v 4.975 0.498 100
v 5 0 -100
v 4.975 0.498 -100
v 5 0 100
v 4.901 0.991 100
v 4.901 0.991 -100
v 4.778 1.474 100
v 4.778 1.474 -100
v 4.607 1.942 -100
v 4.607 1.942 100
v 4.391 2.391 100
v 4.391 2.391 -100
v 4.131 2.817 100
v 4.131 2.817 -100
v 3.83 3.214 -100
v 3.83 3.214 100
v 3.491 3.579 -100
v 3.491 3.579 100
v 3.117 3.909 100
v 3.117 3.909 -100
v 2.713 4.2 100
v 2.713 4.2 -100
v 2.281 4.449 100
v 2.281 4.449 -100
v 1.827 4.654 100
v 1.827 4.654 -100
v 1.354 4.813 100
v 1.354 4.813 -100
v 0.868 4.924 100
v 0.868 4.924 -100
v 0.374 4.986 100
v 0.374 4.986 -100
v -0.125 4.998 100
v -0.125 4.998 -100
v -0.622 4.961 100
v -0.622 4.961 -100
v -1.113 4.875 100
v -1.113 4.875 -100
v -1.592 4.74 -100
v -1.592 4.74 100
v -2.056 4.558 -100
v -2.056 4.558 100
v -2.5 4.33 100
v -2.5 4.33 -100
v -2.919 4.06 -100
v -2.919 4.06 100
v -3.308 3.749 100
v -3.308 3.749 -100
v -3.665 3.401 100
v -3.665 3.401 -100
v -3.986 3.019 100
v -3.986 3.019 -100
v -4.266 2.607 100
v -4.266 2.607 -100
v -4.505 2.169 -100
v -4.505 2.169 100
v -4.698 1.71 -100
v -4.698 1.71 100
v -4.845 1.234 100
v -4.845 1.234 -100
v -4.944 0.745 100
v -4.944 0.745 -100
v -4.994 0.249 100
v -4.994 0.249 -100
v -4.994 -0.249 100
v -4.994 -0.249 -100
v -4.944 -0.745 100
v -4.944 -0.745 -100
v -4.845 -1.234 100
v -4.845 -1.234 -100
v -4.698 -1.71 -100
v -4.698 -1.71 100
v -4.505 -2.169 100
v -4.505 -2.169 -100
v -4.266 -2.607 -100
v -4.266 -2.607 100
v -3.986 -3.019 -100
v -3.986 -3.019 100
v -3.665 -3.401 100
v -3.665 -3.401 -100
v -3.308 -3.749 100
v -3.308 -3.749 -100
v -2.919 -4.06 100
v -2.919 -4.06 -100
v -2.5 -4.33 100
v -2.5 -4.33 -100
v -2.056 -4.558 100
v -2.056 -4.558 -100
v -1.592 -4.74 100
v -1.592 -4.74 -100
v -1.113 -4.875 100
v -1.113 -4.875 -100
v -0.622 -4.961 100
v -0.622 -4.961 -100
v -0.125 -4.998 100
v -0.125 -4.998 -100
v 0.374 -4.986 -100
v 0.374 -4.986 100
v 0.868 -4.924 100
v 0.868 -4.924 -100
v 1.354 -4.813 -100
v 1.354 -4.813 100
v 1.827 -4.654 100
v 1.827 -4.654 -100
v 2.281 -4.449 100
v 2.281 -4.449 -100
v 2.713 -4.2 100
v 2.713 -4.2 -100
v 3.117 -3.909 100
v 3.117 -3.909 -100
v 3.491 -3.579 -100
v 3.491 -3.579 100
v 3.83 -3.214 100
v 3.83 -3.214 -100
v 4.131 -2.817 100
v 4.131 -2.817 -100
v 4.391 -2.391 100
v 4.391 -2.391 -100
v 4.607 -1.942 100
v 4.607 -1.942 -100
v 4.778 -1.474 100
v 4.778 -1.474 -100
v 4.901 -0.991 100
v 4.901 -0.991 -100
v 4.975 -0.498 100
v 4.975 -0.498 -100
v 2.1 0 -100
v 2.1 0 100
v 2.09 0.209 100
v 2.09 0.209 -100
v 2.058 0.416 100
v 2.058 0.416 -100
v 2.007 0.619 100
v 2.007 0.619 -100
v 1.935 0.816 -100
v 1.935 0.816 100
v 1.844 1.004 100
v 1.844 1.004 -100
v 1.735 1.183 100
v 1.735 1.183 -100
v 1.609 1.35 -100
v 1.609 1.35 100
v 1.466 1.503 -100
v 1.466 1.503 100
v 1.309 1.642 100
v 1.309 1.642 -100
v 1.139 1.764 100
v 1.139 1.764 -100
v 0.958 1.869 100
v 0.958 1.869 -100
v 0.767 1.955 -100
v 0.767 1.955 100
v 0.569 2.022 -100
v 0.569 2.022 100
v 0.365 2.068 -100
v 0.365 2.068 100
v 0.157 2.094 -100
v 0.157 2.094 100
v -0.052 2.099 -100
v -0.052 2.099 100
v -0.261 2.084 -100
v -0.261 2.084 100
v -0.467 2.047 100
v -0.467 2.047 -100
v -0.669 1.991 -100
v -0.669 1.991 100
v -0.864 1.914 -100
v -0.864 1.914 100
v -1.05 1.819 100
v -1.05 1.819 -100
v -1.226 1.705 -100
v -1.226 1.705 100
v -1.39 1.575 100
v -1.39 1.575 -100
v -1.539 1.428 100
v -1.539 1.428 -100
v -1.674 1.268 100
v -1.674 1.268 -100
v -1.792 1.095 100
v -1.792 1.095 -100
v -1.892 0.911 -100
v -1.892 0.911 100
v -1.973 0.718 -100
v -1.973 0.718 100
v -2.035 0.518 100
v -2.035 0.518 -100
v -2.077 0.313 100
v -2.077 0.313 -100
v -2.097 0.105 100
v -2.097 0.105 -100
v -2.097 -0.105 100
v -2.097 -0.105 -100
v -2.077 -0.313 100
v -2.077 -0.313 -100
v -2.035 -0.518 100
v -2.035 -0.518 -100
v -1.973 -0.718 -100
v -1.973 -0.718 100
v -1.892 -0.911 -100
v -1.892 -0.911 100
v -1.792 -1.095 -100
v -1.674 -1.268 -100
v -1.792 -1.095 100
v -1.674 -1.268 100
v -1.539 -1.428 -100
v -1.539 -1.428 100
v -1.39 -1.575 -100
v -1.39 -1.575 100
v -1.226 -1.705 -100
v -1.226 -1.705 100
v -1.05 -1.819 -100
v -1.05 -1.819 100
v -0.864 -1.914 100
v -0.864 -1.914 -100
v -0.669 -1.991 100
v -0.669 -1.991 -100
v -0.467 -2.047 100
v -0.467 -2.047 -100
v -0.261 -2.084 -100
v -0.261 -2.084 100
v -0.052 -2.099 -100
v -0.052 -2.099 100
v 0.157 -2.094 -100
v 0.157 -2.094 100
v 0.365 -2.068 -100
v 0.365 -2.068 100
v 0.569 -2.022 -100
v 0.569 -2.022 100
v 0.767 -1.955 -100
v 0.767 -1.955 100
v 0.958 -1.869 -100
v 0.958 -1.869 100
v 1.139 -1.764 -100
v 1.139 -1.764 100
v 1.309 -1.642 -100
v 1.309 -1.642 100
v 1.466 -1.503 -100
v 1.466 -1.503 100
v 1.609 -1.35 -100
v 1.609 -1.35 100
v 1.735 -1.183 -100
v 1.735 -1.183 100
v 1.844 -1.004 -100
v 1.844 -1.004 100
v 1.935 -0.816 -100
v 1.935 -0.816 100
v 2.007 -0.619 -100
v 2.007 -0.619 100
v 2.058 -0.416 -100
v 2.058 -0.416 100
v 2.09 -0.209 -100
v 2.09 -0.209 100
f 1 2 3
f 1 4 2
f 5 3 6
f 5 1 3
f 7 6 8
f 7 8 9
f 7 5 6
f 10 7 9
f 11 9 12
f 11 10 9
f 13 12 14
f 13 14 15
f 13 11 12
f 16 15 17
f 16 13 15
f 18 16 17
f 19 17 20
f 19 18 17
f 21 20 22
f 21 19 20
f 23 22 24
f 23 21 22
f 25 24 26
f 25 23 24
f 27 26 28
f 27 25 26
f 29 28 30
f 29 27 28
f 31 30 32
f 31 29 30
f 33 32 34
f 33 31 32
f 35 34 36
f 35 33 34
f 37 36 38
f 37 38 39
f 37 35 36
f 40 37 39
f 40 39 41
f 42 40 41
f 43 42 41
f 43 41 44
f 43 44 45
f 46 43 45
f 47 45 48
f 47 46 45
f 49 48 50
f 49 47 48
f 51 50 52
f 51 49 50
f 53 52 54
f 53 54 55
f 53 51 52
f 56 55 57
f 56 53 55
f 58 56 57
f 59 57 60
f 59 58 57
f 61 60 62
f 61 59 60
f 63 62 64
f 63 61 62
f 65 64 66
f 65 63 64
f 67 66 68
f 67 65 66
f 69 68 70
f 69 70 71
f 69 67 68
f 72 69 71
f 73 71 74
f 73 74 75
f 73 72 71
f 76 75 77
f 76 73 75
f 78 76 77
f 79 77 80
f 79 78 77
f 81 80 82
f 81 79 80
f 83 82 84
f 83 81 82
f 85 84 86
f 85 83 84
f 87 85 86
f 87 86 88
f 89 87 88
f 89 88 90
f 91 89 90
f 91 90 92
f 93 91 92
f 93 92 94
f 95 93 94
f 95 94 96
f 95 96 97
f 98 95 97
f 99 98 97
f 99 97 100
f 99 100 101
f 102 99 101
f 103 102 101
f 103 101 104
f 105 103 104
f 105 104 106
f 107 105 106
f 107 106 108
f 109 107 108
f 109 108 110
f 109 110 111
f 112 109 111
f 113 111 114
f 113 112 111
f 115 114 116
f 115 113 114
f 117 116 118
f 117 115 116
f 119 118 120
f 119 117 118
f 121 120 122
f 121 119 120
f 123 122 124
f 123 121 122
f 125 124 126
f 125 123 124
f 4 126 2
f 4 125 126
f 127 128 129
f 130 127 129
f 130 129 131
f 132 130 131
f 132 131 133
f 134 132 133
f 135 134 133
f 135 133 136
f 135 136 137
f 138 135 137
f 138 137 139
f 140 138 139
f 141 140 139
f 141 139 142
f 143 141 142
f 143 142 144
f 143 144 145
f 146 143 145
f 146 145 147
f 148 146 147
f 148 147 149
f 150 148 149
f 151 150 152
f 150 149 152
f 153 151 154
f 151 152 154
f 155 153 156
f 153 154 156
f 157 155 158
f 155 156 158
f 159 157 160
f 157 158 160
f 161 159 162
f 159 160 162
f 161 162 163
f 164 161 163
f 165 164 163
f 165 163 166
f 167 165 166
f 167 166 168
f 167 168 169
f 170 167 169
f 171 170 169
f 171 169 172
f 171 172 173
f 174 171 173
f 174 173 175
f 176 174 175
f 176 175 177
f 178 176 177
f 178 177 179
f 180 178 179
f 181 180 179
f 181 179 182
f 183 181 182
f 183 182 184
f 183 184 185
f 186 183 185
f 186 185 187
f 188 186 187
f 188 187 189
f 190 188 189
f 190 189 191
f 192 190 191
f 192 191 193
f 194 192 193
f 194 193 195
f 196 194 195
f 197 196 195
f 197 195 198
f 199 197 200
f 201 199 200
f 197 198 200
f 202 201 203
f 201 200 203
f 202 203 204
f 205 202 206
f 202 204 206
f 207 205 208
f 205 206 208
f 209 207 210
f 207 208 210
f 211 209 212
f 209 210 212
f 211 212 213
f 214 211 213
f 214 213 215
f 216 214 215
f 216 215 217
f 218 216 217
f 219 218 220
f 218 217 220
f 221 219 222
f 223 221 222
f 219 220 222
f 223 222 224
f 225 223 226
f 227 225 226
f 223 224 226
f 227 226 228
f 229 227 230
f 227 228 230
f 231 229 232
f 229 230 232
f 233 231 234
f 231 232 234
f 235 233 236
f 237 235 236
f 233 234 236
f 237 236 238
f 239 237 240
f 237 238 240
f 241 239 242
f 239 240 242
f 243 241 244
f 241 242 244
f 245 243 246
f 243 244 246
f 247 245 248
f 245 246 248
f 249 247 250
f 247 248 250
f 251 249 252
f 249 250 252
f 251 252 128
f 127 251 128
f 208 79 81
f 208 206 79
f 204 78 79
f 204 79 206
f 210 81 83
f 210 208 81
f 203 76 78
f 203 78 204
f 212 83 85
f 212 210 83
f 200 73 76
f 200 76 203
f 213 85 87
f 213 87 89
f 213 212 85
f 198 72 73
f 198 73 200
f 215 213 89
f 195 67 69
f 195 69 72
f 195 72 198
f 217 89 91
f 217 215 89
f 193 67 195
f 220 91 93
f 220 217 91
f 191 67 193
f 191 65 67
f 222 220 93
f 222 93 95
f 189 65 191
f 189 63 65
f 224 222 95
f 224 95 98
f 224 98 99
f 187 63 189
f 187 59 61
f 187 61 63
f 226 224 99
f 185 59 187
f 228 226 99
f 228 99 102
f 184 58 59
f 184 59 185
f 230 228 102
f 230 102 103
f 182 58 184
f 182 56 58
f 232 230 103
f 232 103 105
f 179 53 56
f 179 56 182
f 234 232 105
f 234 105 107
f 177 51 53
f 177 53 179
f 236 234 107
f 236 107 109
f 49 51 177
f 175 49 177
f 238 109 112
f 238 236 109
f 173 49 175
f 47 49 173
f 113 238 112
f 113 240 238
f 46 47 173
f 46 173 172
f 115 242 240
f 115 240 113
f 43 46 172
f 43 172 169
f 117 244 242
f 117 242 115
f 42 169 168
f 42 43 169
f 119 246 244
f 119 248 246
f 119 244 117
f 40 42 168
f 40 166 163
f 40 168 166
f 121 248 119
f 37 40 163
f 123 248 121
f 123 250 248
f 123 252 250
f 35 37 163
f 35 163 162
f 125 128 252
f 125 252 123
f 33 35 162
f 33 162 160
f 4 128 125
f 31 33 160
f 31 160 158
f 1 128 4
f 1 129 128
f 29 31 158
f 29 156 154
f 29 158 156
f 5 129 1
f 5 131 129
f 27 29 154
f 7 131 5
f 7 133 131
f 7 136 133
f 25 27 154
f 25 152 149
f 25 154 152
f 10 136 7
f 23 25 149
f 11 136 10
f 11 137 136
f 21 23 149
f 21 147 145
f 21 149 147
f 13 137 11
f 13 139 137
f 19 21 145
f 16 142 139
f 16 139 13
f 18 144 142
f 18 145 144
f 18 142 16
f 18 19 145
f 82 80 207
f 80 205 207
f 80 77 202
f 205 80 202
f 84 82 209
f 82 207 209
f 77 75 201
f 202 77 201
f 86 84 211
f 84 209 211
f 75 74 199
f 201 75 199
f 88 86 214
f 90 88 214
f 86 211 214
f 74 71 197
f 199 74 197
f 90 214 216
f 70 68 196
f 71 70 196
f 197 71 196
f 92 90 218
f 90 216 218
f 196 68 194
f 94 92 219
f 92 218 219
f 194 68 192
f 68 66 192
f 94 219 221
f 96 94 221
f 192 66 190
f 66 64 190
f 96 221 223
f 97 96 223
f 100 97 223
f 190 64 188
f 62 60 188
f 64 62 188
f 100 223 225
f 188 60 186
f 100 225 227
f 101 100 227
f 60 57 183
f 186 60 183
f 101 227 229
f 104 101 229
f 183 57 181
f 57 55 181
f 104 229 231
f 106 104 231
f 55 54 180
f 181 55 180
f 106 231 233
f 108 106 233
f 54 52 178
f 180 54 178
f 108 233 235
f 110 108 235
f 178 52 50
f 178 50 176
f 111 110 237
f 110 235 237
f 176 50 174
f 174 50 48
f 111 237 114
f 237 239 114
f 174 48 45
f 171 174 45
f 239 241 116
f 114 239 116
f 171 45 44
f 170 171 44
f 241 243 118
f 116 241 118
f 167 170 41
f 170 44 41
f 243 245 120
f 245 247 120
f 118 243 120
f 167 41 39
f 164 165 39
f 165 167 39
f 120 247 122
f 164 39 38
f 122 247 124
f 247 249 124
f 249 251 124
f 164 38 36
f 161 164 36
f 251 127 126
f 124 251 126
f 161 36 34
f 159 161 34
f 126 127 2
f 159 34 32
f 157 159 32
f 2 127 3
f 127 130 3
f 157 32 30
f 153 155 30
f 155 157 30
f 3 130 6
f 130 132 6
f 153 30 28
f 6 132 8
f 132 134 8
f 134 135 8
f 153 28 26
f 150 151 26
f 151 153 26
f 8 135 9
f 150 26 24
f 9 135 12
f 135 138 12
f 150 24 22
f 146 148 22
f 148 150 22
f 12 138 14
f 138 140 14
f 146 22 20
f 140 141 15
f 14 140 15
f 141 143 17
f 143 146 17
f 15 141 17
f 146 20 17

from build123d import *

# Parameters (mm, degrees)
SKETCH_R    = 5
PAD_DEPTH   = 100
SKETCH001_R = 2.1
HOLE_DEPTH  = 600.999753


with BuildPart() as part:
    # Sketch → Pad (new body, symmetric)
    with BuildSketch(Plane.XY):
        Circle(SKETCH_R)
    extrude(amount=PAD_DEPTH, both=True)

    # Sketch001 (on Face3 of Pad) → Hole (cut, through all)
    with BuildSketch(Plane.XY.offset(100)):
        Circle(SKETCH001_R)
    hole = extrude(amount=-HOLE_DEPTH, mode=Mode.SUBTRACT)

    # Mirrored: Hole across XY
    add(hole.mirror(Plane.XY), mode=Mode.SUBTRACT)


solid = part.part
